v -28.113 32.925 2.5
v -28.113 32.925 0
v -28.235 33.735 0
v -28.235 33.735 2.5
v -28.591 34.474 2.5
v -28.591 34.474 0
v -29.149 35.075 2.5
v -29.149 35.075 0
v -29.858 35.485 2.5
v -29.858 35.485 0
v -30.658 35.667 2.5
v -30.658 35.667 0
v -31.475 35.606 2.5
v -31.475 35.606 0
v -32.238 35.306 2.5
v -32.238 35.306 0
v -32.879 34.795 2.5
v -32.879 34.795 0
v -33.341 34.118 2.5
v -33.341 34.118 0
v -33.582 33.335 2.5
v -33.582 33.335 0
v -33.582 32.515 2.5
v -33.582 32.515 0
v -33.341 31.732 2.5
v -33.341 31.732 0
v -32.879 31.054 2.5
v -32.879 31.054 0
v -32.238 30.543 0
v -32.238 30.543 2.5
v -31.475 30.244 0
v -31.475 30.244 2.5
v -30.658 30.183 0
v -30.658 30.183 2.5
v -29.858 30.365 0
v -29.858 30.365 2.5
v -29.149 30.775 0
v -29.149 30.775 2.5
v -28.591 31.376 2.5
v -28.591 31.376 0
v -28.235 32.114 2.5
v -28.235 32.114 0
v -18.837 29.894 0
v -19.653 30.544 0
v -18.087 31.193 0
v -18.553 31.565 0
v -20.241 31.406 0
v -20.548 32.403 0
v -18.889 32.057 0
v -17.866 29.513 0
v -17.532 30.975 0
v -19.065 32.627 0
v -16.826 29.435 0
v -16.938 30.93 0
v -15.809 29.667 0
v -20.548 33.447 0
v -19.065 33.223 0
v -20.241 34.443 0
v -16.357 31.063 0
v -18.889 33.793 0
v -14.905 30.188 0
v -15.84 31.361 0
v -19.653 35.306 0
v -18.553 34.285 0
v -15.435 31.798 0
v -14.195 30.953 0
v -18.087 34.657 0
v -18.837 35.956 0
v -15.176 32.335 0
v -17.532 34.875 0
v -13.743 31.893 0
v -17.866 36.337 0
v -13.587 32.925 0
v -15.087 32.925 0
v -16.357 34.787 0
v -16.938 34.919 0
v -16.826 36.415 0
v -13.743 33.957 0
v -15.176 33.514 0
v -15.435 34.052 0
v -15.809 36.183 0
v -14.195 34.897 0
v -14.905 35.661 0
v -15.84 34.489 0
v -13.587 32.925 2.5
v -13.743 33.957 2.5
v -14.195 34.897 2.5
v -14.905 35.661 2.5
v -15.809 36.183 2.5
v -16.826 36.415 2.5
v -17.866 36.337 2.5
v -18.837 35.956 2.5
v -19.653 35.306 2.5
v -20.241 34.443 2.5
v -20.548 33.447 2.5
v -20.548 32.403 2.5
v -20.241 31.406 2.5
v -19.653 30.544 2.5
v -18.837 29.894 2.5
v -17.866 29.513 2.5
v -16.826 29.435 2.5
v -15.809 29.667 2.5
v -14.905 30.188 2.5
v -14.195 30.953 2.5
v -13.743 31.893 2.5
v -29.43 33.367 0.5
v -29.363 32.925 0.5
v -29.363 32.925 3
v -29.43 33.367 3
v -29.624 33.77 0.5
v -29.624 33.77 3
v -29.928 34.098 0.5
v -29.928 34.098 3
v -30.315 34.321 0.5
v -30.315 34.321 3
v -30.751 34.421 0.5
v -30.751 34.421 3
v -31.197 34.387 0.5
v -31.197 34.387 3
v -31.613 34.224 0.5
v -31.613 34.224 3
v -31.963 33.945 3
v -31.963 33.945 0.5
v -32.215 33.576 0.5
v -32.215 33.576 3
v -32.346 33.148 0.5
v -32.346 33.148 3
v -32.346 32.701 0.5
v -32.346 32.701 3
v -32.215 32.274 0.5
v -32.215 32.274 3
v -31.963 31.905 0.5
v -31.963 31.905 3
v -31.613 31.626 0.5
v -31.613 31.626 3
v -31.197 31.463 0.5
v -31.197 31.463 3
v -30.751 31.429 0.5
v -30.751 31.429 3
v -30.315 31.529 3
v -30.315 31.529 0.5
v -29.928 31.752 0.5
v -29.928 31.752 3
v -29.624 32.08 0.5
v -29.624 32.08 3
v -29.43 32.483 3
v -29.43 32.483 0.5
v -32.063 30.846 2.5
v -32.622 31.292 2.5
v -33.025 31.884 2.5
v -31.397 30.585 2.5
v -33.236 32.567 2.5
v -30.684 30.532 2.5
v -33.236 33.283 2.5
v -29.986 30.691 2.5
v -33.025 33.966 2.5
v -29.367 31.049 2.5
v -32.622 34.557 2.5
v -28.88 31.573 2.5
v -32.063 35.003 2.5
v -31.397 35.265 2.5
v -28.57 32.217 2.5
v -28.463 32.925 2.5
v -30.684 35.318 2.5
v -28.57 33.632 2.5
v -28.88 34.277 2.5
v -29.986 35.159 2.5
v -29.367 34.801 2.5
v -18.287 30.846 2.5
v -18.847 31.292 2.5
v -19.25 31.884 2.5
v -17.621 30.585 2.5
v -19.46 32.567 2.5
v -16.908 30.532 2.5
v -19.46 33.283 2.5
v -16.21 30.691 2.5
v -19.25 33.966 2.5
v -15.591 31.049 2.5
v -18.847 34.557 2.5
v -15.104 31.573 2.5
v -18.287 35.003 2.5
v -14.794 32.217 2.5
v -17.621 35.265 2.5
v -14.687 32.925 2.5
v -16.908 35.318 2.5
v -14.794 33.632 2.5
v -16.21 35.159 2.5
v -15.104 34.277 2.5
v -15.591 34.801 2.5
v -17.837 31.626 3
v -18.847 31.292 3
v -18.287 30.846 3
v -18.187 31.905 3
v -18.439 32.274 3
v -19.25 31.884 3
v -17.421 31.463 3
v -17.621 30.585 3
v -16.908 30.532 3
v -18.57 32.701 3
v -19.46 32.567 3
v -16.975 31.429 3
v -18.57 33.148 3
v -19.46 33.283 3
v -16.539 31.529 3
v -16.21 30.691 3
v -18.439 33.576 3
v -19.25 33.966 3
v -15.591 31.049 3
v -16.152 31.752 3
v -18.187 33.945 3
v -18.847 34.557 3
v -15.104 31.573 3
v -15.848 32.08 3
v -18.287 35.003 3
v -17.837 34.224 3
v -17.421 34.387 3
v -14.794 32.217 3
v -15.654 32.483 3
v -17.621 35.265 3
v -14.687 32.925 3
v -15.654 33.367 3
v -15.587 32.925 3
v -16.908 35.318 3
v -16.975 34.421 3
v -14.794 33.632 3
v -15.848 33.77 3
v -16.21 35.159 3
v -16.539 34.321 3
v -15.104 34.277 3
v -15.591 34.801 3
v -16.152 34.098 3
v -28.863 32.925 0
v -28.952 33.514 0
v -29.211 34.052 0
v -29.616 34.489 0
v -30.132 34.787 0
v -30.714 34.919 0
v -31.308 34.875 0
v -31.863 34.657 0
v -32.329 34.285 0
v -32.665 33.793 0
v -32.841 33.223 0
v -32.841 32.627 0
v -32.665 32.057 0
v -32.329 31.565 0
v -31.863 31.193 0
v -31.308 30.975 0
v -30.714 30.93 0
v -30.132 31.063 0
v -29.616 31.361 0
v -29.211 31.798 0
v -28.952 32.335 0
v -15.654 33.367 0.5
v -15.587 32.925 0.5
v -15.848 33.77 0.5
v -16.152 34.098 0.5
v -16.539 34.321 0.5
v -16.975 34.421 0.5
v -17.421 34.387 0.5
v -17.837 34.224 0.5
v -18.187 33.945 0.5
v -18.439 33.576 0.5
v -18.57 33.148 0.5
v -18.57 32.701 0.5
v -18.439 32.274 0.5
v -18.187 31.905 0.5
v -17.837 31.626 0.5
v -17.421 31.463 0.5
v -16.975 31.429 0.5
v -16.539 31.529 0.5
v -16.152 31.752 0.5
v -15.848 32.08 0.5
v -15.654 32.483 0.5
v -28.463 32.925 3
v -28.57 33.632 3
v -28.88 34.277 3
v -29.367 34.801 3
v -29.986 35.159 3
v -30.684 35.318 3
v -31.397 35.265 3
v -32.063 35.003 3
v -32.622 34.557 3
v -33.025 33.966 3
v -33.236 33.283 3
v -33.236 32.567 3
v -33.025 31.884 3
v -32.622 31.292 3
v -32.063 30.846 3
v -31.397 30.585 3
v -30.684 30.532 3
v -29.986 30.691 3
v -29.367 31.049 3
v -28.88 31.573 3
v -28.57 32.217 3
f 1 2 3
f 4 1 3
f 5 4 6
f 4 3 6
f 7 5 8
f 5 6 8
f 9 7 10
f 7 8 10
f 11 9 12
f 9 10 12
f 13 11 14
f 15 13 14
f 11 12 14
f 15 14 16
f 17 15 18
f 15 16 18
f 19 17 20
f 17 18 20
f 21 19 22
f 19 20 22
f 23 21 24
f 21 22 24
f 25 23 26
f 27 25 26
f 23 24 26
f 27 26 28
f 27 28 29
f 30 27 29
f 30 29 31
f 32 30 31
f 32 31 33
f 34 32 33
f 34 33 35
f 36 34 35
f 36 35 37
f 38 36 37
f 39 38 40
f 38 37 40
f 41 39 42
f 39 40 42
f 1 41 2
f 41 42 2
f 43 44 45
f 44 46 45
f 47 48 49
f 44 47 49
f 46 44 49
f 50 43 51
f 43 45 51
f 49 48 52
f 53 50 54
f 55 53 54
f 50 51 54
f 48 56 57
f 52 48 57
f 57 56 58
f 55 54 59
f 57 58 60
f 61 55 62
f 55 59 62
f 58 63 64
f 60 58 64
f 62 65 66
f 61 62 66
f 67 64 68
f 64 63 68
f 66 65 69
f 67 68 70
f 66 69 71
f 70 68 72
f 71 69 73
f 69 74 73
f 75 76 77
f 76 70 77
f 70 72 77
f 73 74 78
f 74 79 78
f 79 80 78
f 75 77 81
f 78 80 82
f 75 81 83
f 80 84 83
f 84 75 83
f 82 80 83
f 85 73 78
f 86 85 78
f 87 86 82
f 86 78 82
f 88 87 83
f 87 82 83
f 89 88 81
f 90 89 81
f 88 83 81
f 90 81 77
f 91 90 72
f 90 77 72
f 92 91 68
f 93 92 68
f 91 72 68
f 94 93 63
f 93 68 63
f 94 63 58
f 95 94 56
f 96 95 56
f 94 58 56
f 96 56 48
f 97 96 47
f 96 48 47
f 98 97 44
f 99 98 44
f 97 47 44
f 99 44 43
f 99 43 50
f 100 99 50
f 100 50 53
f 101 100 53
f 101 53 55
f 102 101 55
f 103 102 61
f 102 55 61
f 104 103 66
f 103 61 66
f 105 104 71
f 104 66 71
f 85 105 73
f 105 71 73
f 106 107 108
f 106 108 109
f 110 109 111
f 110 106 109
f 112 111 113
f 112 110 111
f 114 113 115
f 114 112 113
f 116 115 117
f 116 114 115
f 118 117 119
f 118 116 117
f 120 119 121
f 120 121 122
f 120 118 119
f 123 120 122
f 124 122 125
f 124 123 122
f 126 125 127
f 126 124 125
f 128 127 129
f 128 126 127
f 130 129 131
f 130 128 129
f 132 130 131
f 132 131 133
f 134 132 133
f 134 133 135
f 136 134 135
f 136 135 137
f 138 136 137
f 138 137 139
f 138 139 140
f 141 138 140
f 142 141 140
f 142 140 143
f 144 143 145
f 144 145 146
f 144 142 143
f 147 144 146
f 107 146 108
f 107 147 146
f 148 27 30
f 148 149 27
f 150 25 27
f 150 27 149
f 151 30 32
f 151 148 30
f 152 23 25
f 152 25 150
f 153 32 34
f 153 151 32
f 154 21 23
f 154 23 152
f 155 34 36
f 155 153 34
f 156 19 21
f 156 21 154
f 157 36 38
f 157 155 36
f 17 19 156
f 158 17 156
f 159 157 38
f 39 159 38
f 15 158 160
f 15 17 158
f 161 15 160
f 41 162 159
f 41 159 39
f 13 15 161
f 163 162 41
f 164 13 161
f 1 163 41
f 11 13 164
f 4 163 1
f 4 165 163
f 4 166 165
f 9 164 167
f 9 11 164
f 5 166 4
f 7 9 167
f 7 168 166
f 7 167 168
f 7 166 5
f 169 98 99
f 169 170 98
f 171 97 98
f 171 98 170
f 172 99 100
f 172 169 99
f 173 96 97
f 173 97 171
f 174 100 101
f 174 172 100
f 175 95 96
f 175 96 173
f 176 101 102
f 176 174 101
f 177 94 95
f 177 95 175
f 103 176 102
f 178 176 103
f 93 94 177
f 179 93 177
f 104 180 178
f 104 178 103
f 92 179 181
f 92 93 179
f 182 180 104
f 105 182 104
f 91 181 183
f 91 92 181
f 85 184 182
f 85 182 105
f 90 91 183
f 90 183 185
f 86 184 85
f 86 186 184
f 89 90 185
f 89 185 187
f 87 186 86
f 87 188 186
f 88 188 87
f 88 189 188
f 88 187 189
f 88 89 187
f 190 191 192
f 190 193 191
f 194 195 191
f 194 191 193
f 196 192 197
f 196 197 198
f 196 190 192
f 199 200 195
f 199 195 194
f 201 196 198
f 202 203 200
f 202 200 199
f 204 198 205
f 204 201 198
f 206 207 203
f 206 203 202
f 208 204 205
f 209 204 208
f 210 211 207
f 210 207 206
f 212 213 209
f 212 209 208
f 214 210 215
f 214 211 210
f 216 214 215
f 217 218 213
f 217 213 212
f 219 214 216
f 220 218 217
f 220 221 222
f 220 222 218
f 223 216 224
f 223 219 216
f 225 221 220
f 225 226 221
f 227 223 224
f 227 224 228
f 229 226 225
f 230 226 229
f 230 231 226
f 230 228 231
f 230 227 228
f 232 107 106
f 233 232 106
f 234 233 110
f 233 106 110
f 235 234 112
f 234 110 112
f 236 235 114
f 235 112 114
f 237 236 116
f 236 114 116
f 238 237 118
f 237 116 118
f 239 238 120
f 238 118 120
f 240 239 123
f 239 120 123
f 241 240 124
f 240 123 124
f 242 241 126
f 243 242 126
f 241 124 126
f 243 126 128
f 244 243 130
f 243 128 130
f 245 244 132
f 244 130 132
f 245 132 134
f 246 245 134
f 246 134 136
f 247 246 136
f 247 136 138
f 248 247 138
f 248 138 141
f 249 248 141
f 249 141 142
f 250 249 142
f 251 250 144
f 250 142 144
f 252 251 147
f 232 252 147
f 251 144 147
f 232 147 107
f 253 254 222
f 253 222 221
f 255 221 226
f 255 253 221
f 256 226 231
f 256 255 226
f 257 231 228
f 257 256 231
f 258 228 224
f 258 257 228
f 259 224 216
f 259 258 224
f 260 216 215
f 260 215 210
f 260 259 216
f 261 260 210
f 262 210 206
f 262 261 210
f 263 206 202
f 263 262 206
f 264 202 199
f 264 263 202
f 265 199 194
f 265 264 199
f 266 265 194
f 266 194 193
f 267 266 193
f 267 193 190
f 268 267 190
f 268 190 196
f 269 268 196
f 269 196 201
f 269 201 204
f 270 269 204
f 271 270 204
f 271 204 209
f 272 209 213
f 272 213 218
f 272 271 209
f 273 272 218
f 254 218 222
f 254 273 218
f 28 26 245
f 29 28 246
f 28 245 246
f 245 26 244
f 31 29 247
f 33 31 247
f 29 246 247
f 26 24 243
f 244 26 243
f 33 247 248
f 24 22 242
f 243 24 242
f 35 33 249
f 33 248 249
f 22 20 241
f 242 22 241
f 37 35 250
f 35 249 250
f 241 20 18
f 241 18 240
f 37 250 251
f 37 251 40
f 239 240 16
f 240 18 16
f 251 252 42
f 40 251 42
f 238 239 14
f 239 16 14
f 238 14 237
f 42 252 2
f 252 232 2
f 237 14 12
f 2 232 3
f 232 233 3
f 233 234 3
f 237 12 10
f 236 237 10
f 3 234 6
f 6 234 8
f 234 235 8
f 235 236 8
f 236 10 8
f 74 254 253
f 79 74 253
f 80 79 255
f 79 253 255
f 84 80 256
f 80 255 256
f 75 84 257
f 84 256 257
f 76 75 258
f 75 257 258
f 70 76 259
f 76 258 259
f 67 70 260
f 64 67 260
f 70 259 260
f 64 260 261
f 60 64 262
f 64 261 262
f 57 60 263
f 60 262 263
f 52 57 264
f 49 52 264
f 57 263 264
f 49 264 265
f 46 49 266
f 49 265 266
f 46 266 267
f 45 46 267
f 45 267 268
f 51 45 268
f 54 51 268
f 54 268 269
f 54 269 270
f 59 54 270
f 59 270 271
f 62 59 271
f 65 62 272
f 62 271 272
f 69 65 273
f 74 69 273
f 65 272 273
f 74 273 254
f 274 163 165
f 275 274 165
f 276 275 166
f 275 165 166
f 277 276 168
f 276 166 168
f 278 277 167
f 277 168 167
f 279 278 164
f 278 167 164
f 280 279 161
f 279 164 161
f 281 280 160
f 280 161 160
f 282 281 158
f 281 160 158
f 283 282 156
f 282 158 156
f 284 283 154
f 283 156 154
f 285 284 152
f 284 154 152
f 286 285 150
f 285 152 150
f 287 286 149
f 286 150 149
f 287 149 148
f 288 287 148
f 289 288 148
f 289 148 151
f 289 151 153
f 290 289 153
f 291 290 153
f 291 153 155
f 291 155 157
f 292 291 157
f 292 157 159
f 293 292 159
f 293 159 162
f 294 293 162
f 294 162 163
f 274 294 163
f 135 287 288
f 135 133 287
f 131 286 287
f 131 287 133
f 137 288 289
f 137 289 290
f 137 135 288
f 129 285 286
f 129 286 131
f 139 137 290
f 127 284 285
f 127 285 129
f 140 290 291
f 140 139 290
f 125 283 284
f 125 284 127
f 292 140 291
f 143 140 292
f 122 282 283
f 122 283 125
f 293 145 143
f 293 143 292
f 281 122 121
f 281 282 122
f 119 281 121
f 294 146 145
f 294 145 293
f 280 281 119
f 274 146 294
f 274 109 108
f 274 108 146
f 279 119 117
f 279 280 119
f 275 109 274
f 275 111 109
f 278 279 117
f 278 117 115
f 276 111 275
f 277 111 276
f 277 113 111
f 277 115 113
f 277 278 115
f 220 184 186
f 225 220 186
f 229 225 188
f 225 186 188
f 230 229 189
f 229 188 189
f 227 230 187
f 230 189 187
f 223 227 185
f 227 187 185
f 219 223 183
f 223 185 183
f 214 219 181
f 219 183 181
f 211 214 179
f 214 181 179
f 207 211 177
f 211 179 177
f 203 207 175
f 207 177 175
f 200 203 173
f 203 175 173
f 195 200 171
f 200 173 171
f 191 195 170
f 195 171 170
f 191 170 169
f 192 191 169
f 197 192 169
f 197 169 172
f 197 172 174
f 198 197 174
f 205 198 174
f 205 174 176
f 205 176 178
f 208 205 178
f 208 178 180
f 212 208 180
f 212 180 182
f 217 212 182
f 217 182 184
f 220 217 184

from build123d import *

# Parameters (mm, degrees)
F0_R     = 2.4
F0_R_2   = 1.5
F1_DEPTH = 3
F0_R_3   = 2.75
F0_R_4   = 3.5
F2_DEPTH = 2.5
F3_SIZE  = 0.5


with BuildPart() as f1:
    # F0 (on Top) → F1 (new body)
    with BuildSketch(Plane.XY):
        with Locations((-30.863109, 32.924905)):
            Circle(F0_R)
        with Locations((-30.863109, 32.924905)):
            Circle(F0_R_2, mode=Mode.SUBTRACT)
        with Locations((-17.087233, 32.924905)):
            Circle(F0_R)
        with Locations((-17.087233, 32.924905)):
            Circle(F0_R_2, mode=Mode.SUBTRACT)
    extrude(amount=F1_DEPTH)

    # F0 (on Top) → F2 (join)
    with BuildSketch(Plane.XY):
        with Locations((-30.863109, 32.924905)):
            Circle(F0_R_3)
        with Locations((-30.863109, 32.924905)):
            Circle(F0_R, mode=Mode.SUBTRACT)
        with Locations((-17.087233, 32.924905)):
            Circle(F0_R_4)
        with Locations((-17.087233, 32.924905)):
            Circle(F0_R, mode=Mode.SUBTRACT)
    extrude(amount=F2_DEPTH)

    # F3
    f3_edges = [f1.edges().sort_by_distance(p)[0] for p in [
        (-32.363109, 32.924905, 0),
        (-18.587233, 32.924905, 0),
    ]]
    chamfer(f3_edges, length=F3_SIZE)


solid = f1.part
